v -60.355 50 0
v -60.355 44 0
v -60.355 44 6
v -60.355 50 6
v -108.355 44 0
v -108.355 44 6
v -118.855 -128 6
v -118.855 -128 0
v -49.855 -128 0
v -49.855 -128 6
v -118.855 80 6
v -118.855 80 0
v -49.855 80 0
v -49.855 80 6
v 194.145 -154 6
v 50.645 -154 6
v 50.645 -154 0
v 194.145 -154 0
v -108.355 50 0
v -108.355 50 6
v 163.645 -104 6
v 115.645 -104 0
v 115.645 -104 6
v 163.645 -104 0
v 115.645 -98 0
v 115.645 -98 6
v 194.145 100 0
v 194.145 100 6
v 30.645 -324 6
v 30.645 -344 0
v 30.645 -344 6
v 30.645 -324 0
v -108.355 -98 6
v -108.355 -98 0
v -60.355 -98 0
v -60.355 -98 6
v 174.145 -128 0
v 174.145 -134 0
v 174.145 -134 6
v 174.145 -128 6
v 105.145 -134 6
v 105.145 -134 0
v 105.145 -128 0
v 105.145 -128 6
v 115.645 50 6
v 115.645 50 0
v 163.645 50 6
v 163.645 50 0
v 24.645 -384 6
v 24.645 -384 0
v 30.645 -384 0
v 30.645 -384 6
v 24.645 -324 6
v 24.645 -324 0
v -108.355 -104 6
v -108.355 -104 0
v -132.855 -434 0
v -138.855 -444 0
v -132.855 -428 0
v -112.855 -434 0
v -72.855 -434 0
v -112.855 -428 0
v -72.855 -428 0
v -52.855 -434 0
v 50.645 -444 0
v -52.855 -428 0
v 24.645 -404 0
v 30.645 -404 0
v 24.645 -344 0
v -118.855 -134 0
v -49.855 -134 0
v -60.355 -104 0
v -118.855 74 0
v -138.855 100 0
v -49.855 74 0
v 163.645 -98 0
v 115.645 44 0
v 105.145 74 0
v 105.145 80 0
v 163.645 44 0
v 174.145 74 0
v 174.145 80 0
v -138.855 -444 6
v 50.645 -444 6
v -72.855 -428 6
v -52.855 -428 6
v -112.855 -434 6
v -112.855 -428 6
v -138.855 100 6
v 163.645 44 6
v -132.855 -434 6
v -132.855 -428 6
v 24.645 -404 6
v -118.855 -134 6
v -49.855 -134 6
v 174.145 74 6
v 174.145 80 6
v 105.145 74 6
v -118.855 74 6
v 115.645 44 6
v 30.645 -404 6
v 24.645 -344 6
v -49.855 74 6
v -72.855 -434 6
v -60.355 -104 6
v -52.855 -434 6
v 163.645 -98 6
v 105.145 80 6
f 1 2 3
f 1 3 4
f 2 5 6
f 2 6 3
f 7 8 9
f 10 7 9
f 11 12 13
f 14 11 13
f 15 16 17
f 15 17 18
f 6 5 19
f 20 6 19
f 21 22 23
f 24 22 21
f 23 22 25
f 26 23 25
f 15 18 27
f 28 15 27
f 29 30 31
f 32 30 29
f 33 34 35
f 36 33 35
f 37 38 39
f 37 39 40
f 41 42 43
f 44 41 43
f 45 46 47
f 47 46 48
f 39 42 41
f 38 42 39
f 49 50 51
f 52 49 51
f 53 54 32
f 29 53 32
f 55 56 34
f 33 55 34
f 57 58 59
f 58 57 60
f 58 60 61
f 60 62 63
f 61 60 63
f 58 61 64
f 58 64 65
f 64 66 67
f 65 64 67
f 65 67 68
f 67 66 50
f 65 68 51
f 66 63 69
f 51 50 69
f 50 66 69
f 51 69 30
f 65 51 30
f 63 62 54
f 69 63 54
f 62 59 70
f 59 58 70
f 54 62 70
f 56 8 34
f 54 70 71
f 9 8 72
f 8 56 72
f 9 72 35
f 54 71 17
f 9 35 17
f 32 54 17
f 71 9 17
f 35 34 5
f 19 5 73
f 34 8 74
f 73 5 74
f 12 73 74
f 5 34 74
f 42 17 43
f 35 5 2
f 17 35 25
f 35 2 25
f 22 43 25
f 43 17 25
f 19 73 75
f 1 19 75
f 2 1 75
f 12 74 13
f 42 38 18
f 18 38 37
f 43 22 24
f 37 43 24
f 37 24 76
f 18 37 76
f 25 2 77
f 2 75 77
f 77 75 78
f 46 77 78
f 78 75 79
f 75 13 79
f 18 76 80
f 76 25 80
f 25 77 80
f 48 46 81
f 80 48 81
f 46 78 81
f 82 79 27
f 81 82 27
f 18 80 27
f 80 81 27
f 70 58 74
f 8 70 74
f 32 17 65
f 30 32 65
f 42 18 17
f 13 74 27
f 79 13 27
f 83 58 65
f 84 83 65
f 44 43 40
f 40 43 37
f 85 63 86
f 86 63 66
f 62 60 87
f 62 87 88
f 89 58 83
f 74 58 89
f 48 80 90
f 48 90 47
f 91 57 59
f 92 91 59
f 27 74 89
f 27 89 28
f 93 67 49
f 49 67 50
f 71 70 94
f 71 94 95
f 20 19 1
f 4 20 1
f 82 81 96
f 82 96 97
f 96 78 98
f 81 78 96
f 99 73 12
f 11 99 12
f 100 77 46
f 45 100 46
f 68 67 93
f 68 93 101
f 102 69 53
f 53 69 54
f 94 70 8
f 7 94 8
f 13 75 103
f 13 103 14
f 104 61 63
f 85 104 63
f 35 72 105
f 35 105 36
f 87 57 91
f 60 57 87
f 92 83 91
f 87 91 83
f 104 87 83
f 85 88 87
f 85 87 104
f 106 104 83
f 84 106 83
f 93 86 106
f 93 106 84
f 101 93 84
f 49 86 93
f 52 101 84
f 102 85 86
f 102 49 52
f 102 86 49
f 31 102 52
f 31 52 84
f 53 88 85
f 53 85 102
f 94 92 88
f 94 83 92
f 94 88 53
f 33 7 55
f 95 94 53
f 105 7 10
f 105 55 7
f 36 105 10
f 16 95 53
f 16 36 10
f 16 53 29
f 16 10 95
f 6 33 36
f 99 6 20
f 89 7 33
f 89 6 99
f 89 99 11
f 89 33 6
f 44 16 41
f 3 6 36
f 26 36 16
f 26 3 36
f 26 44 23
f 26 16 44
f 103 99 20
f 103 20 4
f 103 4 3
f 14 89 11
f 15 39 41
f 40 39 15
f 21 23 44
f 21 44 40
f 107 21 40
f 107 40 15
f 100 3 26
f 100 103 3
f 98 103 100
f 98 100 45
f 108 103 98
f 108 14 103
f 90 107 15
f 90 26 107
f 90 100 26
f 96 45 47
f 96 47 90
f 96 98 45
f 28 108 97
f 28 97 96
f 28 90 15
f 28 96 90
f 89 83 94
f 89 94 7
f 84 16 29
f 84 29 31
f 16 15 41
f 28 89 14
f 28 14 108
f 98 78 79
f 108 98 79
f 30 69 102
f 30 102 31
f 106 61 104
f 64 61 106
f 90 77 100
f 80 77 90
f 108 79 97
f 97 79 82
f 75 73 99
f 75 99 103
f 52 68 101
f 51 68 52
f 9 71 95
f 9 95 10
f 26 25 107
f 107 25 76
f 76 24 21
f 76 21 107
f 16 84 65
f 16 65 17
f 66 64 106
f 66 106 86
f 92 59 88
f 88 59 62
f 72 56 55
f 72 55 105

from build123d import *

# Parameters (mm, degrees)
SKETCH1_W           = 333
SKETCH1_H           = 544
SKETCH1_W_2         = 48
SKETCH1_H_2         = 6
SKETCH1_W_3         = 69
SKETCH1_W_4         = 6
SKETCH1_H_3         = 20
SKETCH1_W_5         = 20
BOSS_EXTRUDE1_DEPTH = 6
SKETCH2_W           = 143.5
SKETCH2_H           = 290
CUT_EXTRUDE1_DEPTH  = 6


with BuildPart() as part:
    # Sketch1 → Boss-Extrude1 (new body)
    with BuildSketch(Plane.XY):
        with Locations((27.644903204, -172)):
            Rectangle(SKETCH1_W, SKETCH1_H)
        with Locations((139.644903204, 47)):
            Rectangle(SKETCH1_W_2, SKETCH1_H_2, mode=Mode.SUBTRACT)
        with Locations((139.644903204, 77)):
            Rectangle(SKETCH1_W_3, SKETCH1_H_2, mode=Mode.SUBTRACT)
        with Locations((139.644903204, -101)):
            Rectangle(SKETCH1_W_2, SKETCH1_H_2, mode=Mode.SUBTRACT)
        with Locations((139.644903204, -131)):
            Rectangle(SKETCH1_W_3, SKETCH1_H_2, mode=Mode.SUBTRACT)
        with Locations((-84.355096796, 77)):
            Rectangle(SKETCH1_W_3, SKETCH1_H_2, mode=Mode.SUBTRACT)
        with Locations((-84.355096796, 47)):
            Rectangle(SKETCH1_W_2, SKETCH1_H_2, mode=Mode.SUBTRACT)
        with Locations((-84.355096796, -101)):
            Rectangle(SKETCH1_W_2, SKETCH1_H_2, mode=Mode.SUBTRACT)
        with Locations((-84.355096796, -131)):
            Rectangle(SKETCH1_W_3, SKETCH1_H_2, mode=Mode.SUBTRACT)
        with Locations((27.644903204, -394)):
            Rectangle(SKETCH1_W_4, SKETCH1_H_3, mode=Mode.SUBTRACT)
        with Locations((27.644903204, -334)):
            Rectangle(SKETCH1_W_4, SKETCH1_H_3, mode=Mode.SUBTRACT)
        with Locations((-62.855096796, -431)):
            Rectangle(SKETCH1_W_5, SKETCH1_H_2, mode=Mode.SUBTRACT)
        with Locations((-122.855096796, -431)):
            Rectangle(SKETCH1_W_5, SKETCH1_H_2, mode=Mode.SUBTRACT)
    extrude(amount=BOSS_EXTRUDE1_DEPTH)

    # Sketch2 → Cut-Extrude1 (cut)
    with BuildSketch(Plane.XY.offset(6)):
        with Locations((122.394903204, -299)):
            Rectangle(SKETCH2_W, SKETCH2_H)
    extrude(amount=-CUT_EXTRUDE1_DEPTH, mode=Mode.SUBTRACT)


solid = part.part
